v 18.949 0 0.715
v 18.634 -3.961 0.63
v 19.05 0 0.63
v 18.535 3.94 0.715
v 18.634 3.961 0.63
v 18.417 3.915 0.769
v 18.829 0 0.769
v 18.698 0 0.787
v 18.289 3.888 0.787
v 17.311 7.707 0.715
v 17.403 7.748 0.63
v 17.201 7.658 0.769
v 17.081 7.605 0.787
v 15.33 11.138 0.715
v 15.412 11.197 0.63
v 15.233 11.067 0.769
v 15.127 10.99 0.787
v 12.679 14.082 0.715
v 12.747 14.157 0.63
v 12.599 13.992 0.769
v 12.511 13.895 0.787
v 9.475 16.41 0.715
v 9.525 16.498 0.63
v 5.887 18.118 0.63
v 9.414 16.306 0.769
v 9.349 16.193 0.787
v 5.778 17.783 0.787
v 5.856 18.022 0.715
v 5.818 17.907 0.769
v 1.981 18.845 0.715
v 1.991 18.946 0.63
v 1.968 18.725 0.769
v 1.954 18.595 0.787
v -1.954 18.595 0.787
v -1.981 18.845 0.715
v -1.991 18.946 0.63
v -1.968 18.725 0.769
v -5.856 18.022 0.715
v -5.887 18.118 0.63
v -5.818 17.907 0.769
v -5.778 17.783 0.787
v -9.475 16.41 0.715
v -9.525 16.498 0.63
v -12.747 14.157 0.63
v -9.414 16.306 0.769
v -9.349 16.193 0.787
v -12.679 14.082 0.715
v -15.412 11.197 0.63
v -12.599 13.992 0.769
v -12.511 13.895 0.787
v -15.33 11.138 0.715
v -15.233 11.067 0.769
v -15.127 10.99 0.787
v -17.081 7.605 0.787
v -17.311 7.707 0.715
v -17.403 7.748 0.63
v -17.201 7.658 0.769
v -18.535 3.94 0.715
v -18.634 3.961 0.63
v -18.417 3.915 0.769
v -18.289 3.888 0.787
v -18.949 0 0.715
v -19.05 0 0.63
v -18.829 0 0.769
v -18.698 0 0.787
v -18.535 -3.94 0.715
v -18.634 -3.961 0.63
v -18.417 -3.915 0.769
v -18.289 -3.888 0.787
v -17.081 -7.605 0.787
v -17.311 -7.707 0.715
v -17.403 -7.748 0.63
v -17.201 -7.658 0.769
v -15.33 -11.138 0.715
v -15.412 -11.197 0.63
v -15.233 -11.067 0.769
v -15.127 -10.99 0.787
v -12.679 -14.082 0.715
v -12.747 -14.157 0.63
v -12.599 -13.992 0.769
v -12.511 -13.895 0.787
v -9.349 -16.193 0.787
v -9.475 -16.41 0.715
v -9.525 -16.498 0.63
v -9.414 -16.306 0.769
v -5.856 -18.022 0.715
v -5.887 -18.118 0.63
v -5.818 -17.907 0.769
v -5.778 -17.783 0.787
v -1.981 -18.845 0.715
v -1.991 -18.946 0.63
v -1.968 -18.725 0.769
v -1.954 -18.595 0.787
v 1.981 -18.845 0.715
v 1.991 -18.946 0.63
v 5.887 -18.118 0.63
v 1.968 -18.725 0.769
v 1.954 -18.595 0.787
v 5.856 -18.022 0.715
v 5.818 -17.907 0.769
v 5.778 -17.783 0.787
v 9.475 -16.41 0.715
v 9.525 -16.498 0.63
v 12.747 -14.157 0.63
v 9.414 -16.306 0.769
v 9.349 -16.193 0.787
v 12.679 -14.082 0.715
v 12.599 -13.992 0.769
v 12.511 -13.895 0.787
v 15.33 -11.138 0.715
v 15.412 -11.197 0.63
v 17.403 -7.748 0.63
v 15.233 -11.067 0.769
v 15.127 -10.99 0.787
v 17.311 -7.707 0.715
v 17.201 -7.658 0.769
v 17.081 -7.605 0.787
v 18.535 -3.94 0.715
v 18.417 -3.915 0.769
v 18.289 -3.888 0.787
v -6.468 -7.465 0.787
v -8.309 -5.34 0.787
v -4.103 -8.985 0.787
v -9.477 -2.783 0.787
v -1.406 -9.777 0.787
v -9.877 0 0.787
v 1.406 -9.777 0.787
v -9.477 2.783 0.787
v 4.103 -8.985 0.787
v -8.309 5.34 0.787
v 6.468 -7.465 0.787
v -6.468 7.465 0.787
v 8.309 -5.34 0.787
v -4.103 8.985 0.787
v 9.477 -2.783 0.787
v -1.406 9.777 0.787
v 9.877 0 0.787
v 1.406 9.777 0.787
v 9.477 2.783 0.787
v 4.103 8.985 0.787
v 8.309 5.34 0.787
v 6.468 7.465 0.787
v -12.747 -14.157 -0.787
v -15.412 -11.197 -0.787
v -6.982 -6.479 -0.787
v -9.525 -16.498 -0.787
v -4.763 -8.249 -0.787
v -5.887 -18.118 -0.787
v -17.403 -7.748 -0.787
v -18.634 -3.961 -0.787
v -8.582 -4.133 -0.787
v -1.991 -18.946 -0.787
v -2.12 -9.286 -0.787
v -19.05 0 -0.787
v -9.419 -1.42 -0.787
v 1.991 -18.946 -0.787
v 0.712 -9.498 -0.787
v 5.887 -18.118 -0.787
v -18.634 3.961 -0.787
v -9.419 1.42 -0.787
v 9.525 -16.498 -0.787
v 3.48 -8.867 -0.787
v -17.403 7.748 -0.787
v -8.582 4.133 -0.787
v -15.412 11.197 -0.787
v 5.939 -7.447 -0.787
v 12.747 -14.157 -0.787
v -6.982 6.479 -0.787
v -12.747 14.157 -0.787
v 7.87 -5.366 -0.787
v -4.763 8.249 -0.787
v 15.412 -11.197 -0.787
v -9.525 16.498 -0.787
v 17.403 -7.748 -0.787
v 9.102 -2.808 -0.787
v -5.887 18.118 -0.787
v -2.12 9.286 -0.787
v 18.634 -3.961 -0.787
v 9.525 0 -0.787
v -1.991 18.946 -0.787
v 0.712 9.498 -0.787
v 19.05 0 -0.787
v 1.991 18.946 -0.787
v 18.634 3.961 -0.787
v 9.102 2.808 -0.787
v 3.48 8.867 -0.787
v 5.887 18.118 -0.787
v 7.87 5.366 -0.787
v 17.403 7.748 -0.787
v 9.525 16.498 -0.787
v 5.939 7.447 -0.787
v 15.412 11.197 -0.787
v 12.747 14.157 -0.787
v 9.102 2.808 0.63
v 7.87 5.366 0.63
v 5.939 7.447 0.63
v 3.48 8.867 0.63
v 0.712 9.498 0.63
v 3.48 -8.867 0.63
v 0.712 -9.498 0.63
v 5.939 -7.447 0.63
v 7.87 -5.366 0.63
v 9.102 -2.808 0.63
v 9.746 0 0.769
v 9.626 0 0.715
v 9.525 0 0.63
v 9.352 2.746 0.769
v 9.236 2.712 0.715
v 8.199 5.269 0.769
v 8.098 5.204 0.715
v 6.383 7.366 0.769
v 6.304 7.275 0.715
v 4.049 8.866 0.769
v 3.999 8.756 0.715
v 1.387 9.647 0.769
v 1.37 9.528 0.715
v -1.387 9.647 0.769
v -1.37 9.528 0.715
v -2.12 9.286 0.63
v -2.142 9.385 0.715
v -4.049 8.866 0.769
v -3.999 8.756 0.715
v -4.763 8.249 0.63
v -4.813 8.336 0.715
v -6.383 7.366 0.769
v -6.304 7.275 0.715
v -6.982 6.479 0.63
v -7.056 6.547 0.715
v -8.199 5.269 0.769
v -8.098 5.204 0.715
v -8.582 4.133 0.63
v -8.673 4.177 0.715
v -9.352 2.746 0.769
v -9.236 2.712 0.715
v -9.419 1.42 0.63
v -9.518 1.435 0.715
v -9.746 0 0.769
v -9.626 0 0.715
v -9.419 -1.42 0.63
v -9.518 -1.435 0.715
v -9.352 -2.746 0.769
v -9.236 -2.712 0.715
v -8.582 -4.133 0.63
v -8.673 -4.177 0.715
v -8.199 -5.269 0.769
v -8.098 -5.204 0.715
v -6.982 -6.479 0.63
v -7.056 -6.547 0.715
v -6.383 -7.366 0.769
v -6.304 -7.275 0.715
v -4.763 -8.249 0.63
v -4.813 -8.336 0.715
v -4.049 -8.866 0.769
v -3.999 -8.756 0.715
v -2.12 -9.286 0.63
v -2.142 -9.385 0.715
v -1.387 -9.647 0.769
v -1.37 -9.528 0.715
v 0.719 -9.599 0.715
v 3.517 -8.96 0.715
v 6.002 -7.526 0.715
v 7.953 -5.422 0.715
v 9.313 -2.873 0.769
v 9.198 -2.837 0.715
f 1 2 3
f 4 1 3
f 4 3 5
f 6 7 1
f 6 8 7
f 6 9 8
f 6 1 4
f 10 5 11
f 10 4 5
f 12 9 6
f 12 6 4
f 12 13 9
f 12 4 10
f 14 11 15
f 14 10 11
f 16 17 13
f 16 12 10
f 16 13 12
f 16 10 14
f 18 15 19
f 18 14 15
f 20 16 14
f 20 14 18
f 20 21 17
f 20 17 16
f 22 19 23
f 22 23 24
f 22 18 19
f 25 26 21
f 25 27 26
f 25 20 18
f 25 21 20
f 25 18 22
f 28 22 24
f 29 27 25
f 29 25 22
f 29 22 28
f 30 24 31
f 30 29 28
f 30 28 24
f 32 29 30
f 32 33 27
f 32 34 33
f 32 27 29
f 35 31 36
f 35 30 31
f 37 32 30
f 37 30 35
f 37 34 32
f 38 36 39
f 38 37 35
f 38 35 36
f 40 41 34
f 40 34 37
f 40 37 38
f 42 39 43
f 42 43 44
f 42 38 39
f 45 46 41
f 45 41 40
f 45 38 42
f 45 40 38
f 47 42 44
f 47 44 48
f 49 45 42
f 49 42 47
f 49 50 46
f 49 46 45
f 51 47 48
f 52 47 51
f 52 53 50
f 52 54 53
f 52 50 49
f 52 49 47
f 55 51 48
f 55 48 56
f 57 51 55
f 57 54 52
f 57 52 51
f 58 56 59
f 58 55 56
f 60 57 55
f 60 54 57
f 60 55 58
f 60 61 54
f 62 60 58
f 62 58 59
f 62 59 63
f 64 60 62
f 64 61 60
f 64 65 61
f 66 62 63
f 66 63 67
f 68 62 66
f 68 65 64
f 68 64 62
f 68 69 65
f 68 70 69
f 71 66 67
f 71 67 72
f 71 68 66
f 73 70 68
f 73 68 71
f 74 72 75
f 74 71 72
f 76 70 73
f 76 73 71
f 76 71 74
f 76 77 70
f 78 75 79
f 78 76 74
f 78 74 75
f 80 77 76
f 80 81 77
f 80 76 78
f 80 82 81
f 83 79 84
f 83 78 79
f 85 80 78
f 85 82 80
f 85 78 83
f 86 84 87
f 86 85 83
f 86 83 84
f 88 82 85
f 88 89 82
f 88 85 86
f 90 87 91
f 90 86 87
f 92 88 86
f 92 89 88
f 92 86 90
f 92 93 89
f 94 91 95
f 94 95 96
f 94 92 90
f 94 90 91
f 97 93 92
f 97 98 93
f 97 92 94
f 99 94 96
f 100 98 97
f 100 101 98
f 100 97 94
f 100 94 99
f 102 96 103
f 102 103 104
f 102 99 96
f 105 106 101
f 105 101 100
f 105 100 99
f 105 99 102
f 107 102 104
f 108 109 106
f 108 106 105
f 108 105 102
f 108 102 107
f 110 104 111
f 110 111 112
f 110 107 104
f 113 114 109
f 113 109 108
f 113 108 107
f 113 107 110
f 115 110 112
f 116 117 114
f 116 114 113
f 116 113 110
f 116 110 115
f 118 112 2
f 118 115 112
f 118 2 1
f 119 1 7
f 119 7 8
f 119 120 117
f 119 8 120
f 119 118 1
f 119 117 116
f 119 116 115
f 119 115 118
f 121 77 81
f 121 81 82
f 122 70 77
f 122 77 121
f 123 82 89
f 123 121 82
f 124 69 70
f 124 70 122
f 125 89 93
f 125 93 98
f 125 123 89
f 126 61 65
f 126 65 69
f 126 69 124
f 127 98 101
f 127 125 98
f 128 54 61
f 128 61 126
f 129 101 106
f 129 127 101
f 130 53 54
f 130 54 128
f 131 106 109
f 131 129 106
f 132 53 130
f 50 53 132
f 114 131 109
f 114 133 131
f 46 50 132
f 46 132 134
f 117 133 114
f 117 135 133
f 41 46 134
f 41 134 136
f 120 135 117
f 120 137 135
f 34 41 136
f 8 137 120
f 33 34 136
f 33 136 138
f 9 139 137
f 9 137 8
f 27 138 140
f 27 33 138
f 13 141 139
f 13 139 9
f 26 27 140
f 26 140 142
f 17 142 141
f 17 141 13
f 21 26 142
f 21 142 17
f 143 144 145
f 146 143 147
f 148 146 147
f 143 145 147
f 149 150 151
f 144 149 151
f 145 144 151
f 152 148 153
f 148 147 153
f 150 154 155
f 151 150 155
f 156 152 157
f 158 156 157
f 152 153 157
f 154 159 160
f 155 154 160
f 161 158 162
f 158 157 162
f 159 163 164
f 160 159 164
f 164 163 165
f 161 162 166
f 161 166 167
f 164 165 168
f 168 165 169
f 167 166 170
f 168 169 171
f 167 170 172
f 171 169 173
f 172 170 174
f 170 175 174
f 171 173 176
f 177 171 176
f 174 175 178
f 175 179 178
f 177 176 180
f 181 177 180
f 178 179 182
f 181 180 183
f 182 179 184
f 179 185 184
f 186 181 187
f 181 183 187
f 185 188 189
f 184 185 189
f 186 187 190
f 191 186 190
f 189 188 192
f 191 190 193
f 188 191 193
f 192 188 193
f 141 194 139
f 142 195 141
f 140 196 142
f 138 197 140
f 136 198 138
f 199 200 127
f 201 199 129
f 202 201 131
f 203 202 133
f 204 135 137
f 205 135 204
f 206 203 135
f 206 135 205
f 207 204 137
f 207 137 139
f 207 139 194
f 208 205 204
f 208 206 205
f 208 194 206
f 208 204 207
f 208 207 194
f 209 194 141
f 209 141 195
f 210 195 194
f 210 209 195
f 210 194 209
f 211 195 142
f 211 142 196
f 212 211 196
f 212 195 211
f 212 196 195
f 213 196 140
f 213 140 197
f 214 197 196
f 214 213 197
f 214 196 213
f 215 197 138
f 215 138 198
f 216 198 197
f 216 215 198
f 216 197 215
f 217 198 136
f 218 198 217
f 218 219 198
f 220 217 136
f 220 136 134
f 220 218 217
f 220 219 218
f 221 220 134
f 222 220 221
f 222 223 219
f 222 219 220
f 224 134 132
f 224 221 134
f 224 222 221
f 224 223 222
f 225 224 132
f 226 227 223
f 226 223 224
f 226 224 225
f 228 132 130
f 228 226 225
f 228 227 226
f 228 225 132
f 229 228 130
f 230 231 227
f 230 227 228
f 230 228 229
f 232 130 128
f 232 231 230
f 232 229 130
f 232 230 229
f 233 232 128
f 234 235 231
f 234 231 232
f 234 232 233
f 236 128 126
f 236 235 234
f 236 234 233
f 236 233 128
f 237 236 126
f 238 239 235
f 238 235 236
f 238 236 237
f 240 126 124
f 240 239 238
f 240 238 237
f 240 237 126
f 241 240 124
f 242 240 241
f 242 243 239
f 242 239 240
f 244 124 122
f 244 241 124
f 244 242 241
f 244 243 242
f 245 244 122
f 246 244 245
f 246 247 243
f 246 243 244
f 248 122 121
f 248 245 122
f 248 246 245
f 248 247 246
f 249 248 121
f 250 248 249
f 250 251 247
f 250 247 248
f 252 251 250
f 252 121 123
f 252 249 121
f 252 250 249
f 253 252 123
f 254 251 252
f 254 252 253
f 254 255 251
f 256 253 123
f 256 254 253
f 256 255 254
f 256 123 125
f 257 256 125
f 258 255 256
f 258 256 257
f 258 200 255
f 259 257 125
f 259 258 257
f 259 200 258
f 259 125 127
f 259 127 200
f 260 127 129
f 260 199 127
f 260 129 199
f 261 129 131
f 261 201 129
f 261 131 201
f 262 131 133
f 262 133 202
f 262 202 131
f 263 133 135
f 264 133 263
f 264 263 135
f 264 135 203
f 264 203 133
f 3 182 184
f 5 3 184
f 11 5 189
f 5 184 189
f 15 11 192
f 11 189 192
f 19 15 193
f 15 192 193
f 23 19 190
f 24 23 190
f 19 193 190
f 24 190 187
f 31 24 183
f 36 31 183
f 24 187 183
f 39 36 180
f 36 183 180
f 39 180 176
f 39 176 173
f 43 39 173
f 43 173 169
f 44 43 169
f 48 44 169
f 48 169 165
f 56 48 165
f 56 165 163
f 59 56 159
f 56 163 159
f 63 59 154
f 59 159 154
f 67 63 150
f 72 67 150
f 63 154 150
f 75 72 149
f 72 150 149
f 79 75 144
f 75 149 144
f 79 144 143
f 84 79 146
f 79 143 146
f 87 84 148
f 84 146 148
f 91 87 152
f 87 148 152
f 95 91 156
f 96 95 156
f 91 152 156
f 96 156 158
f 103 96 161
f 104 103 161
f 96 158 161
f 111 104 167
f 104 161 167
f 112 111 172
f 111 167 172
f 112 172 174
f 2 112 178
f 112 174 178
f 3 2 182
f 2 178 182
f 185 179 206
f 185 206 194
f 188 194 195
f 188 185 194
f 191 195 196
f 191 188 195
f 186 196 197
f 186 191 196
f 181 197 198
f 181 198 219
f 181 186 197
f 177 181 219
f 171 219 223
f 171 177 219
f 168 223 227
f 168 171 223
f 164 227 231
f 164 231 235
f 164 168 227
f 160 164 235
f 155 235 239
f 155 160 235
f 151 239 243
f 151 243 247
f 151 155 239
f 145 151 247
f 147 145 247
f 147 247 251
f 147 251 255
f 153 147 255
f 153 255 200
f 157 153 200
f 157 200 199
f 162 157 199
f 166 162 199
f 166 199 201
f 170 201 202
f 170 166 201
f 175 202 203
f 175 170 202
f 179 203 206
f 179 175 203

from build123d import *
from OCP.BRepFilletAPI import BRepFilletAPI_MakeChamfer

# Parameters (mm, degrees)
BOSS_EXTRUDE1_START = -0.7874
SKETCH3_R           = 19.05
SKETCH3_R_2         = 9.525
BOSS_EXTRUDE1_DEPTH = 1.5748
CHAMFER1_SIZE       = 0.15748
CHAMFER1_SIZE2      = 0.09092112
FILLET1_R           = 0.47244


with BuildPart() as part:
    # Sketch3 → Boss-Extrude1 (new body)
    with BuildSketch(Plane.XY.offset(BOSS_EXTRUDE1_START)):
        Circle(SKETCH3_R)
        Circle(SKETCH3_R_2, mode=Mode.SUBTRACT)
    extrude(amount=BOSS_EXTRUDE1_DEPTH)

    # Chamfer1: one chamfer whose edges measure the first distance from different faces: ONE call of the kernel's chamfer builder (chamfer() names one face for all edges)
    chamfer1_edges_1 = [part.edges().sort_by_distance(p)[0] for p in [
        (-19.05, 0, 0.7874),
    ]]
    chamfer1_side_1 = [part.faces().sort_by_distance(p)[0] for p in [
        (-19.05, 0, 0),
    ]]
    chamfer1_edges_2 = [part.edges().sort_by_distance(p)[0] for p in [
        (-9.525, 0, 0.7874),
    ]]
    chamfer1_side_2 = [part.faces().sort_by_distance(p)[0] for p in [
        (-9.525, 0, 0),
    ]]
    chamfer1 = BRepFilletAPI_MakeChamfer(part.part.solid().wrapped)
    for e in chamfer1_edges_1:
        chamfer1.Add(CHAMFER1_SIZE, CHAMFER1_SIZE2, e.wrapped, chamfer1_side_1[0].wrapped)  # the first distance lies on this face
    for e in chamfer1_edges_2:
        chamfer1.Add(CHAMFER1_SIZE, CHAMFER1_SIZE2, e.wrapped, chamfer1_side_2[0].wrapped)  # the first distance lies on this face
    add(Compound.cast(chamfer1.Shape()), mode=Mode.REPLACE)

    # Fillet1
    # the kernel refuses this fillet: 0.47244 mm, written as the material it takes off along each edge
    with BuildSketch(Plane(origin=(0, 0, 0.7874), x_dir=(1, 0, 0), z_dir=(0, -1, 0))) as fillet1_piece_1:
        with BuildLine():
            CenterArc((18.697864015, -0.47244), FILLET1_R, 41.810314896, 48.189685104)
            Line((18.697864015, 0), (18.697864015, 0.0094488))
            Line((18.697864015, 0.0094488), (18.95907888, 0.0094488))
            Line((18.95907888, 0.0094488), (18.96726178, 0.0047244))
            ThreePointArc((18.96726178, 0.0047244), (19.012722341, -0.0740156), (19.05704272, -0.1511808))
            Line((19.05704272, -0.1511808), (19.05, -0.15748))
        make_face()
    revolve(axis=Axis((0, 0, 0.7874), (0, 0, 1)), mode=Mode.SUBTRACT)
    with BuildSketch(Plane(origin=(0, 0, 0.7874), x_dir=(1, 0, 0), z_dir=(0, -1, 0))) as fillet1_piece_2:
        with BuildLine():
            CenterArc((9.877135985, -0.47244), FILLET1_R, 90, 48.189685104)
            Line((9.525, -0.15748), (9.51795728, -0.1511808))
            ThreePointArc((9.51795728, -0.1511808), (9.562277659, -0.0740156), (9.60773822, 0.0047244))
            Line((9.60773822, 0.0047244), (9.61592112, 0.0094488))
            Line((9.61592112, 0.0094488), (9.877135985, 0.0094488))
            Line((9.877135985, 0.0094488), (9.877135985, 0))
        make_face()
    revolve(axis=Axis((0, 0, 0.7874), (0, 0, 1)), mode=Mode.SUBTRACT)


solid = part.part
